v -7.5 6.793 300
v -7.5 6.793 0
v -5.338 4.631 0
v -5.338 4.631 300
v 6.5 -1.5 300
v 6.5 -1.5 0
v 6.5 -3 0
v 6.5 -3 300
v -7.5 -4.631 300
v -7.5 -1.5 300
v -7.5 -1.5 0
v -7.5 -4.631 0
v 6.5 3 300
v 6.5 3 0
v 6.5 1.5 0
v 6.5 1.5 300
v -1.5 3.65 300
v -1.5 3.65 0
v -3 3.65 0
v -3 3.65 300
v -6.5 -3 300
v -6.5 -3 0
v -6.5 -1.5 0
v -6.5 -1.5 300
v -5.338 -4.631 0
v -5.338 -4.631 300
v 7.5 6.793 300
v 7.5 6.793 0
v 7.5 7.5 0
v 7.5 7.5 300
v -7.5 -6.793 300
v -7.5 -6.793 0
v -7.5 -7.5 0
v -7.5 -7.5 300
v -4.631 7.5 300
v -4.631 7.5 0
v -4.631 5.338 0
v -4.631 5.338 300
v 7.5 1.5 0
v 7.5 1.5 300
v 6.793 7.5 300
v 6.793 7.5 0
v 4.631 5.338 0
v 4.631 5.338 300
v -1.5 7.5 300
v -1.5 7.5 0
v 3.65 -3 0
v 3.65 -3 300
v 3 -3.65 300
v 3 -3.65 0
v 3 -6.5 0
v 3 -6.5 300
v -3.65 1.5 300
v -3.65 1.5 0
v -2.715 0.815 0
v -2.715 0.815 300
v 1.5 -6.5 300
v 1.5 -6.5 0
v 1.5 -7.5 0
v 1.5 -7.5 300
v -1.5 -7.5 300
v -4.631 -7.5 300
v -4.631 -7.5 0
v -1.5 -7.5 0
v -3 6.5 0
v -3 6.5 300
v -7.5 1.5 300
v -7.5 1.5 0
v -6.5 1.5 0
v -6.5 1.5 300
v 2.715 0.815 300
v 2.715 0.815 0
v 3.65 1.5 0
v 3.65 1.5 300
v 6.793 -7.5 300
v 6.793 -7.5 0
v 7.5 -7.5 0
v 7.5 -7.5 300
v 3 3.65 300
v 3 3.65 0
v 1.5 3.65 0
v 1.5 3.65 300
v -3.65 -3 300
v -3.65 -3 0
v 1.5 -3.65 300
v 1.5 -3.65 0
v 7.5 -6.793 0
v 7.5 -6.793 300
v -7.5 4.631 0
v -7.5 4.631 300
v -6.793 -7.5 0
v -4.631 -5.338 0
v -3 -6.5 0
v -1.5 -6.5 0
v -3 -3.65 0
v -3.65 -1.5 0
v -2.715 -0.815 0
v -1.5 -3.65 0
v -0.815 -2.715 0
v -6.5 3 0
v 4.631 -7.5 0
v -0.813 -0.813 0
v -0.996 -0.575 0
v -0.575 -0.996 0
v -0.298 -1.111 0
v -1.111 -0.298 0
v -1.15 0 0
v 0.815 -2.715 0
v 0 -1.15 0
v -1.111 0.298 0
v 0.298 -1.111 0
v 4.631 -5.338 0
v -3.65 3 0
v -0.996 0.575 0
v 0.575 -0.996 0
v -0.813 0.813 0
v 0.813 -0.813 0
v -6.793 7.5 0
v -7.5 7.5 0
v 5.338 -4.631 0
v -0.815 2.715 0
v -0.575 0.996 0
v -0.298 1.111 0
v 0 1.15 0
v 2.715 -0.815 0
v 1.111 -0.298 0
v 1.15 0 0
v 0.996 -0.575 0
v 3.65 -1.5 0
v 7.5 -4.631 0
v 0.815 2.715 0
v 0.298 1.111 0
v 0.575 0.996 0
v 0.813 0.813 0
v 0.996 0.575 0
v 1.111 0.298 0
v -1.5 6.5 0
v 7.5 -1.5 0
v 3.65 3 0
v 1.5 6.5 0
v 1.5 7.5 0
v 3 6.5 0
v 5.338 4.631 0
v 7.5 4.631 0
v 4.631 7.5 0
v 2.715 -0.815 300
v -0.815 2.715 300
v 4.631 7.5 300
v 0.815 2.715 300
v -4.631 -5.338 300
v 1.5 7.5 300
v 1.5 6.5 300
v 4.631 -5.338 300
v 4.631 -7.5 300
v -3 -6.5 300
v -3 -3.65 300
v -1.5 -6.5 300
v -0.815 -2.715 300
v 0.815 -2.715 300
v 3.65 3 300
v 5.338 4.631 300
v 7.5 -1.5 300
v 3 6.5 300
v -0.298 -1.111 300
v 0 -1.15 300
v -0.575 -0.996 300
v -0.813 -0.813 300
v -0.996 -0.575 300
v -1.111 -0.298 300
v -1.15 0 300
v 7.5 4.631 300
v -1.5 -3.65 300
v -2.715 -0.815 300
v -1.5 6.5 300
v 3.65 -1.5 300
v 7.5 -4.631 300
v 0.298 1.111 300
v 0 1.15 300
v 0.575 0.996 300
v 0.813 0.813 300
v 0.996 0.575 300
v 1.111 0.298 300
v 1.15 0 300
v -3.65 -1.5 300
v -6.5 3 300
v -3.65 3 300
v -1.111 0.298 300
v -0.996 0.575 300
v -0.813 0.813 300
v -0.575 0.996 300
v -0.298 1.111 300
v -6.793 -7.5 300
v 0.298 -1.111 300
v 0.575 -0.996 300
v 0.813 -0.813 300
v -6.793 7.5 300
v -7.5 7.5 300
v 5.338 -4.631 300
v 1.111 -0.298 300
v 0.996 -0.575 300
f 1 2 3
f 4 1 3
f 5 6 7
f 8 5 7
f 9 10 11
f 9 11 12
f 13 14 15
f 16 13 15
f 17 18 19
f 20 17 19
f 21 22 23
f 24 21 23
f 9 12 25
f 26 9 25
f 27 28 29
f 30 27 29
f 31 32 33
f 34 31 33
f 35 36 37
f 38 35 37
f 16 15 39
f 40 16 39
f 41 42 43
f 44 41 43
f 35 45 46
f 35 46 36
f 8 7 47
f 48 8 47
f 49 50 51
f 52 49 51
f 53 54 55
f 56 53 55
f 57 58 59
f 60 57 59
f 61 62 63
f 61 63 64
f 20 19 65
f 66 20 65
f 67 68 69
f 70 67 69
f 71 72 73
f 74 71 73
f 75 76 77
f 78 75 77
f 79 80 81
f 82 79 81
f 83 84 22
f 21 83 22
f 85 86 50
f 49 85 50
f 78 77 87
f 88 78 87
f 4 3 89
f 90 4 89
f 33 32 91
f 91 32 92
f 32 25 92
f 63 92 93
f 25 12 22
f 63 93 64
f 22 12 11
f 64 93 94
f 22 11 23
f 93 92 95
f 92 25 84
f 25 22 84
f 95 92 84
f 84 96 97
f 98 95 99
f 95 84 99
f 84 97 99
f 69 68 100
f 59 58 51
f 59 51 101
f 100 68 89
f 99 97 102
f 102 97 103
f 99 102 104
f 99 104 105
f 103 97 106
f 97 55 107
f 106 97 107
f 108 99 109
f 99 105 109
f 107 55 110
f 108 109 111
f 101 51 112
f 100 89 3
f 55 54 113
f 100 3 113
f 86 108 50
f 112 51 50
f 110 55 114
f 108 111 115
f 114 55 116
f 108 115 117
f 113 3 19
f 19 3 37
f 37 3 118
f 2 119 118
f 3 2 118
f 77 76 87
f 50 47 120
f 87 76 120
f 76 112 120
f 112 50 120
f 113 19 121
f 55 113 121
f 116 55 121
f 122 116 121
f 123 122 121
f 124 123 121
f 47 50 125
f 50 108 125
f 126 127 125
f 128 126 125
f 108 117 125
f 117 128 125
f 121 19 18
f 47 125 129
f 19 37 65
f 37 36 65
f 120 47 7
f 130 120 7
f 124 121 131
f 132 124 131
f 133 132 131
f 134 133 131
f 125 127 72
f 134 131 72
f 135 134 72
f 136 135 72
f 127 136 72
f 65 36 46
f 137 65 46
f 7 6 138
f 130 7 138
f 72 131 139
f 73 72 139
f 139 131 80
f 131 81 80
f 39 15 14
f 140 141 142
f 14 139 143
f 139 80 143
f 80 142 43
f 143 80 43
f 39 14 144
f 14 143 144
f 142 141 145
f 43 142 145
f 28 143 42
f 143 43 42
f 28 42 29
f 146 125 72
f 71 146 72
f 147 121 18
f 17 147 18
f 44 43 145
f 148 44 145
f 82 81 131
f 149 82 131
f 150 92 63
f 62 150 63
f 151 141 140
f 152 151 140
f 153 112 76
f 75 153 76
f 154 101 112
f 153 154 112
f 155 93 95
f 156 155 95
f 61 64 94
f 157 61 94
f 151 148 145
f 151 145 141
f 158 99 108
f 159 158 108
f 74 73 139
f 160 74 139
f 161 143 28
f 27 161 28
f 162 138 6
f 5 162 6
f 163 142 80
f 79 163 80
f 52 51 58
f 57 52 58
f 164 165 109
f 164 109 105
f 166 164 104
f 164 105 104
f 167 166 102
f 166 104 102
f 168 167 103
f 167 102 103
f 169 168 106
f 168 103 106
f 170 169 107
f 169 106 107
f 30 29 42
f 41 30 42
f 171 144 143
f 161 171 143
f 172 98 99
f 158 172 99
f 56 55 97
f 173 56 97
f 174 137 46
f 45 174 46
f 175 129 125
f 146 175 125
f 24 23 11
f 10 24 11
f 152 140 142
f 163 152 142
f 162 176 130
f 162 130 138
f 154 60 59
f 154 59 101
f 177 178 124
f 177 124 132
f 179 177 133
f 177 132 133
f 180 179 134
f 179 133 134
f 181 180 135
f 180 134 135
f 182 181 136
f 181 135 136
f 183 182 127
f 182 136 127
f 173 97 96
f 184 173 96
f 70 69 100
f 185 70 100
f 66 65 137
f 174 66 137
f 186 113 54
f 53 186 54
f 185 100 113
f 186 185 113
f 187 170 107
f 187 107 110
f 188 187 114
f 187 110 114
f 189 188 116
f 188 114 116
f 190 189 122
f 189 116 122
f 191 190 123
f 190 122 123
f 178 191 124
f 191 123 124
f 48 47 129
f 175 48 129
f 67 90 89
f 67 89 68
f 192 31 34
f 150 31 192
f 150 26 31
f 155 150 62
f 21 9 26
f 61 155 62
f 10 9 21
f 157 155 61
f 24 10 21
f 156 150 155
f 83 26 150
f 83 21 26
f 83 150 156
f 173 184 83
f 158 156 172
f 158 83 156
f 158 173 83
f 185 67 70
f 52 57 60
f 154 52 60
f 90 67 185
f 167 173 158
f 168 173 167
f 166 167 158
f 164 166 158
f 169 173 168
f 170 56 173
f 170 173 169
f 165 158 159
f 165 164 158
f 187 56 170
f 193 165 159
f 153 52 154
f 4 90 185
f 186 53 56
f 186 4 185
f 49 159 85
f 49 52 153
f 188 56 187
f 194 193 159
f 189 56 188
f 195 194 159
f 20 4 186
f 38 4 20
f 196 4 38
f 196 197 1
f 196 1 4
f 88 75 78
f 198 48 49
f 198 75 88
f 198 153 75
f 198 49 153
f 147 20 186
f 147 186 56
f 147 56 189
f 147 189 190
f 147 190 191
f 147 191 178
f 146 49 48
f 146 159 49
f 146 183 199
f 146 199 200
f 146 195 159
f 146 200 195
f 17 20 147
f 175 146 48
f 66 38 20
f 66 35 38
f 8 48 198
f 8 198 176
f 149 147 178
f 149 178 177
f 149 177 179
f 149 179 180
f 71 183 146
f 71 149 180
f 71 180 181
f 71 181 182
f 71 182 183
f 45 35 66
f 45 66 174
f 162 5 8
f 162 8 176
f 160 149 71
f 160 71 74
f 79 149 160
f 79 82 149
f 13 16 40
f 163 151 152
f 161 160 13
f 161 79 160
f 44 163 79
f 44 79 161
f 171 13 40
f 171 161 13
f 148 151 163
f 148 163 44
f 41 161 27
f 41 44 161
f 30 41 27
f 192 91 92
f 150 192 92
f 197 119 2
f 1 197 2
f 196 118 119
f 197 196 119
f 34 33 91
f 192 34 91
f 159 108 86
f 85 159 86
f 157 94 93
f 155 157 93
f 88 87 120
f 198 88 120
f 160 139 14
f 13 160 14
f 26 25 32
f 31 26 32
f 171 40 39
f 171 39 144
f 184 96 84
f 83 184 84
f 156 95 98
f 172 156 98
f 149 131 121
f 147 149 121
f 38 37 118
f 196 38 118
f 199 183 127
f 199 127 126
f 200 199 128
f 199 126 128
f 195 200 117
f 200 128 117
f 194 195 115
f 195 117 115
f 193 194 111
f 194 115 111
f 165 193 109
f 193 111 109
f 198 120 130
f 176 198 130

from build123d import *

# Parameters (mm, degrees)
F1_DEPTH = 300


with BuildPart() as f1:
    # F0 (on Top) → F1 (new body)
    with BuildSketch(Plane.XY):
        Polygon((-7.5, 4.630586), (-7.5, 1.5), (-6.5, 1.5), (-6.5, 3), (-3.65, 3), (-3.65, 1.5), (-2.714823, 0.814886), (-2.714823, 0), (-2.714823, -0.814886), (-3.65, -1.5), (-3.65, -3), (-6.5, -3), (-6.5, -1.5), (-7.5, -1.5), (-7.5, -4.630586), (-5.337693, -4.630586), (-7.5, -6.792893), (-7.5, -7.5), (-6.792893, -7.5), (-4.630586, -5.337693), (-4.630586, -7.5), (-1.5, -7.5), (-1.5, -6.5), (-3, -6.5), (-3, -3.65), (-1.5, -3.65), (-0.814886, -2.714823), (0, -2.714823), (0.814886, -2.714823), (1.5, -3.65), (3, -3.65), (3, -6.5), (1.5, -6.5), (1.5, -7.5), (4.630586, -7.5), (4.630586, -5.337693), (6.792893, -7.5), (7.5, -7.5), (7.5, -6.792893), (5.337693, -4.630586), (7.5, -4.630586), (7.5, -1.5), (6.5, -1.5), (6.5, -3), (3.65, -3), (3.65, -1.5), (2.714823, -0.814886), (2.714823, 0), (2.714823, 0.814886), (3.65, 1.5), (3.65, 3), (6.5, 3), (6.5, 1.5), (7.5, 1.5), (7.5, 4.630586), (5.337693, 4.630586), (7.5, 6.792893), (7.5, 7.5), (6.792893, 7.5), (4.630586, 5.337693), (4.630586, 7.5), (1.5, 7.5), (1.5, 6.5), (3, 6.5), (3, 3.65), (1.5, 3.65), (0.814886, 2.714823), (0, 2.714823), (-0.814886, 2.714823), (-1.5, 3.65), (-3, 3.65), (-3, 6.5), (-1.5, 6.5), (-1.5, 7.5), (-4.630586, 7.5), (-4.630586, 5.337693), (-6.792893, 7.5), (-7.5, 7.5), (-7.5, 6.792893), (-5.337693, 4.630586), align=None)
        with BuildLine():
            ThreePointArc((-1.15, 0), (-0.813173, 0.813173), (0, 1.15))
            ThreePointArc((0, 1.15), (0.813173, 0.813173), (1.15, 0))
            ThreePointArc((1.15, 0), (0.813173, -0.813173), (0, -1.15))
            ThreePointArc((0, -1.15), (-0.813173, -0.813173), (-1.15, 0))
        make_face(mode=Mode.SUBTRACT)
    extrude(amount=F1_DEPTH)


solid = f1.part
